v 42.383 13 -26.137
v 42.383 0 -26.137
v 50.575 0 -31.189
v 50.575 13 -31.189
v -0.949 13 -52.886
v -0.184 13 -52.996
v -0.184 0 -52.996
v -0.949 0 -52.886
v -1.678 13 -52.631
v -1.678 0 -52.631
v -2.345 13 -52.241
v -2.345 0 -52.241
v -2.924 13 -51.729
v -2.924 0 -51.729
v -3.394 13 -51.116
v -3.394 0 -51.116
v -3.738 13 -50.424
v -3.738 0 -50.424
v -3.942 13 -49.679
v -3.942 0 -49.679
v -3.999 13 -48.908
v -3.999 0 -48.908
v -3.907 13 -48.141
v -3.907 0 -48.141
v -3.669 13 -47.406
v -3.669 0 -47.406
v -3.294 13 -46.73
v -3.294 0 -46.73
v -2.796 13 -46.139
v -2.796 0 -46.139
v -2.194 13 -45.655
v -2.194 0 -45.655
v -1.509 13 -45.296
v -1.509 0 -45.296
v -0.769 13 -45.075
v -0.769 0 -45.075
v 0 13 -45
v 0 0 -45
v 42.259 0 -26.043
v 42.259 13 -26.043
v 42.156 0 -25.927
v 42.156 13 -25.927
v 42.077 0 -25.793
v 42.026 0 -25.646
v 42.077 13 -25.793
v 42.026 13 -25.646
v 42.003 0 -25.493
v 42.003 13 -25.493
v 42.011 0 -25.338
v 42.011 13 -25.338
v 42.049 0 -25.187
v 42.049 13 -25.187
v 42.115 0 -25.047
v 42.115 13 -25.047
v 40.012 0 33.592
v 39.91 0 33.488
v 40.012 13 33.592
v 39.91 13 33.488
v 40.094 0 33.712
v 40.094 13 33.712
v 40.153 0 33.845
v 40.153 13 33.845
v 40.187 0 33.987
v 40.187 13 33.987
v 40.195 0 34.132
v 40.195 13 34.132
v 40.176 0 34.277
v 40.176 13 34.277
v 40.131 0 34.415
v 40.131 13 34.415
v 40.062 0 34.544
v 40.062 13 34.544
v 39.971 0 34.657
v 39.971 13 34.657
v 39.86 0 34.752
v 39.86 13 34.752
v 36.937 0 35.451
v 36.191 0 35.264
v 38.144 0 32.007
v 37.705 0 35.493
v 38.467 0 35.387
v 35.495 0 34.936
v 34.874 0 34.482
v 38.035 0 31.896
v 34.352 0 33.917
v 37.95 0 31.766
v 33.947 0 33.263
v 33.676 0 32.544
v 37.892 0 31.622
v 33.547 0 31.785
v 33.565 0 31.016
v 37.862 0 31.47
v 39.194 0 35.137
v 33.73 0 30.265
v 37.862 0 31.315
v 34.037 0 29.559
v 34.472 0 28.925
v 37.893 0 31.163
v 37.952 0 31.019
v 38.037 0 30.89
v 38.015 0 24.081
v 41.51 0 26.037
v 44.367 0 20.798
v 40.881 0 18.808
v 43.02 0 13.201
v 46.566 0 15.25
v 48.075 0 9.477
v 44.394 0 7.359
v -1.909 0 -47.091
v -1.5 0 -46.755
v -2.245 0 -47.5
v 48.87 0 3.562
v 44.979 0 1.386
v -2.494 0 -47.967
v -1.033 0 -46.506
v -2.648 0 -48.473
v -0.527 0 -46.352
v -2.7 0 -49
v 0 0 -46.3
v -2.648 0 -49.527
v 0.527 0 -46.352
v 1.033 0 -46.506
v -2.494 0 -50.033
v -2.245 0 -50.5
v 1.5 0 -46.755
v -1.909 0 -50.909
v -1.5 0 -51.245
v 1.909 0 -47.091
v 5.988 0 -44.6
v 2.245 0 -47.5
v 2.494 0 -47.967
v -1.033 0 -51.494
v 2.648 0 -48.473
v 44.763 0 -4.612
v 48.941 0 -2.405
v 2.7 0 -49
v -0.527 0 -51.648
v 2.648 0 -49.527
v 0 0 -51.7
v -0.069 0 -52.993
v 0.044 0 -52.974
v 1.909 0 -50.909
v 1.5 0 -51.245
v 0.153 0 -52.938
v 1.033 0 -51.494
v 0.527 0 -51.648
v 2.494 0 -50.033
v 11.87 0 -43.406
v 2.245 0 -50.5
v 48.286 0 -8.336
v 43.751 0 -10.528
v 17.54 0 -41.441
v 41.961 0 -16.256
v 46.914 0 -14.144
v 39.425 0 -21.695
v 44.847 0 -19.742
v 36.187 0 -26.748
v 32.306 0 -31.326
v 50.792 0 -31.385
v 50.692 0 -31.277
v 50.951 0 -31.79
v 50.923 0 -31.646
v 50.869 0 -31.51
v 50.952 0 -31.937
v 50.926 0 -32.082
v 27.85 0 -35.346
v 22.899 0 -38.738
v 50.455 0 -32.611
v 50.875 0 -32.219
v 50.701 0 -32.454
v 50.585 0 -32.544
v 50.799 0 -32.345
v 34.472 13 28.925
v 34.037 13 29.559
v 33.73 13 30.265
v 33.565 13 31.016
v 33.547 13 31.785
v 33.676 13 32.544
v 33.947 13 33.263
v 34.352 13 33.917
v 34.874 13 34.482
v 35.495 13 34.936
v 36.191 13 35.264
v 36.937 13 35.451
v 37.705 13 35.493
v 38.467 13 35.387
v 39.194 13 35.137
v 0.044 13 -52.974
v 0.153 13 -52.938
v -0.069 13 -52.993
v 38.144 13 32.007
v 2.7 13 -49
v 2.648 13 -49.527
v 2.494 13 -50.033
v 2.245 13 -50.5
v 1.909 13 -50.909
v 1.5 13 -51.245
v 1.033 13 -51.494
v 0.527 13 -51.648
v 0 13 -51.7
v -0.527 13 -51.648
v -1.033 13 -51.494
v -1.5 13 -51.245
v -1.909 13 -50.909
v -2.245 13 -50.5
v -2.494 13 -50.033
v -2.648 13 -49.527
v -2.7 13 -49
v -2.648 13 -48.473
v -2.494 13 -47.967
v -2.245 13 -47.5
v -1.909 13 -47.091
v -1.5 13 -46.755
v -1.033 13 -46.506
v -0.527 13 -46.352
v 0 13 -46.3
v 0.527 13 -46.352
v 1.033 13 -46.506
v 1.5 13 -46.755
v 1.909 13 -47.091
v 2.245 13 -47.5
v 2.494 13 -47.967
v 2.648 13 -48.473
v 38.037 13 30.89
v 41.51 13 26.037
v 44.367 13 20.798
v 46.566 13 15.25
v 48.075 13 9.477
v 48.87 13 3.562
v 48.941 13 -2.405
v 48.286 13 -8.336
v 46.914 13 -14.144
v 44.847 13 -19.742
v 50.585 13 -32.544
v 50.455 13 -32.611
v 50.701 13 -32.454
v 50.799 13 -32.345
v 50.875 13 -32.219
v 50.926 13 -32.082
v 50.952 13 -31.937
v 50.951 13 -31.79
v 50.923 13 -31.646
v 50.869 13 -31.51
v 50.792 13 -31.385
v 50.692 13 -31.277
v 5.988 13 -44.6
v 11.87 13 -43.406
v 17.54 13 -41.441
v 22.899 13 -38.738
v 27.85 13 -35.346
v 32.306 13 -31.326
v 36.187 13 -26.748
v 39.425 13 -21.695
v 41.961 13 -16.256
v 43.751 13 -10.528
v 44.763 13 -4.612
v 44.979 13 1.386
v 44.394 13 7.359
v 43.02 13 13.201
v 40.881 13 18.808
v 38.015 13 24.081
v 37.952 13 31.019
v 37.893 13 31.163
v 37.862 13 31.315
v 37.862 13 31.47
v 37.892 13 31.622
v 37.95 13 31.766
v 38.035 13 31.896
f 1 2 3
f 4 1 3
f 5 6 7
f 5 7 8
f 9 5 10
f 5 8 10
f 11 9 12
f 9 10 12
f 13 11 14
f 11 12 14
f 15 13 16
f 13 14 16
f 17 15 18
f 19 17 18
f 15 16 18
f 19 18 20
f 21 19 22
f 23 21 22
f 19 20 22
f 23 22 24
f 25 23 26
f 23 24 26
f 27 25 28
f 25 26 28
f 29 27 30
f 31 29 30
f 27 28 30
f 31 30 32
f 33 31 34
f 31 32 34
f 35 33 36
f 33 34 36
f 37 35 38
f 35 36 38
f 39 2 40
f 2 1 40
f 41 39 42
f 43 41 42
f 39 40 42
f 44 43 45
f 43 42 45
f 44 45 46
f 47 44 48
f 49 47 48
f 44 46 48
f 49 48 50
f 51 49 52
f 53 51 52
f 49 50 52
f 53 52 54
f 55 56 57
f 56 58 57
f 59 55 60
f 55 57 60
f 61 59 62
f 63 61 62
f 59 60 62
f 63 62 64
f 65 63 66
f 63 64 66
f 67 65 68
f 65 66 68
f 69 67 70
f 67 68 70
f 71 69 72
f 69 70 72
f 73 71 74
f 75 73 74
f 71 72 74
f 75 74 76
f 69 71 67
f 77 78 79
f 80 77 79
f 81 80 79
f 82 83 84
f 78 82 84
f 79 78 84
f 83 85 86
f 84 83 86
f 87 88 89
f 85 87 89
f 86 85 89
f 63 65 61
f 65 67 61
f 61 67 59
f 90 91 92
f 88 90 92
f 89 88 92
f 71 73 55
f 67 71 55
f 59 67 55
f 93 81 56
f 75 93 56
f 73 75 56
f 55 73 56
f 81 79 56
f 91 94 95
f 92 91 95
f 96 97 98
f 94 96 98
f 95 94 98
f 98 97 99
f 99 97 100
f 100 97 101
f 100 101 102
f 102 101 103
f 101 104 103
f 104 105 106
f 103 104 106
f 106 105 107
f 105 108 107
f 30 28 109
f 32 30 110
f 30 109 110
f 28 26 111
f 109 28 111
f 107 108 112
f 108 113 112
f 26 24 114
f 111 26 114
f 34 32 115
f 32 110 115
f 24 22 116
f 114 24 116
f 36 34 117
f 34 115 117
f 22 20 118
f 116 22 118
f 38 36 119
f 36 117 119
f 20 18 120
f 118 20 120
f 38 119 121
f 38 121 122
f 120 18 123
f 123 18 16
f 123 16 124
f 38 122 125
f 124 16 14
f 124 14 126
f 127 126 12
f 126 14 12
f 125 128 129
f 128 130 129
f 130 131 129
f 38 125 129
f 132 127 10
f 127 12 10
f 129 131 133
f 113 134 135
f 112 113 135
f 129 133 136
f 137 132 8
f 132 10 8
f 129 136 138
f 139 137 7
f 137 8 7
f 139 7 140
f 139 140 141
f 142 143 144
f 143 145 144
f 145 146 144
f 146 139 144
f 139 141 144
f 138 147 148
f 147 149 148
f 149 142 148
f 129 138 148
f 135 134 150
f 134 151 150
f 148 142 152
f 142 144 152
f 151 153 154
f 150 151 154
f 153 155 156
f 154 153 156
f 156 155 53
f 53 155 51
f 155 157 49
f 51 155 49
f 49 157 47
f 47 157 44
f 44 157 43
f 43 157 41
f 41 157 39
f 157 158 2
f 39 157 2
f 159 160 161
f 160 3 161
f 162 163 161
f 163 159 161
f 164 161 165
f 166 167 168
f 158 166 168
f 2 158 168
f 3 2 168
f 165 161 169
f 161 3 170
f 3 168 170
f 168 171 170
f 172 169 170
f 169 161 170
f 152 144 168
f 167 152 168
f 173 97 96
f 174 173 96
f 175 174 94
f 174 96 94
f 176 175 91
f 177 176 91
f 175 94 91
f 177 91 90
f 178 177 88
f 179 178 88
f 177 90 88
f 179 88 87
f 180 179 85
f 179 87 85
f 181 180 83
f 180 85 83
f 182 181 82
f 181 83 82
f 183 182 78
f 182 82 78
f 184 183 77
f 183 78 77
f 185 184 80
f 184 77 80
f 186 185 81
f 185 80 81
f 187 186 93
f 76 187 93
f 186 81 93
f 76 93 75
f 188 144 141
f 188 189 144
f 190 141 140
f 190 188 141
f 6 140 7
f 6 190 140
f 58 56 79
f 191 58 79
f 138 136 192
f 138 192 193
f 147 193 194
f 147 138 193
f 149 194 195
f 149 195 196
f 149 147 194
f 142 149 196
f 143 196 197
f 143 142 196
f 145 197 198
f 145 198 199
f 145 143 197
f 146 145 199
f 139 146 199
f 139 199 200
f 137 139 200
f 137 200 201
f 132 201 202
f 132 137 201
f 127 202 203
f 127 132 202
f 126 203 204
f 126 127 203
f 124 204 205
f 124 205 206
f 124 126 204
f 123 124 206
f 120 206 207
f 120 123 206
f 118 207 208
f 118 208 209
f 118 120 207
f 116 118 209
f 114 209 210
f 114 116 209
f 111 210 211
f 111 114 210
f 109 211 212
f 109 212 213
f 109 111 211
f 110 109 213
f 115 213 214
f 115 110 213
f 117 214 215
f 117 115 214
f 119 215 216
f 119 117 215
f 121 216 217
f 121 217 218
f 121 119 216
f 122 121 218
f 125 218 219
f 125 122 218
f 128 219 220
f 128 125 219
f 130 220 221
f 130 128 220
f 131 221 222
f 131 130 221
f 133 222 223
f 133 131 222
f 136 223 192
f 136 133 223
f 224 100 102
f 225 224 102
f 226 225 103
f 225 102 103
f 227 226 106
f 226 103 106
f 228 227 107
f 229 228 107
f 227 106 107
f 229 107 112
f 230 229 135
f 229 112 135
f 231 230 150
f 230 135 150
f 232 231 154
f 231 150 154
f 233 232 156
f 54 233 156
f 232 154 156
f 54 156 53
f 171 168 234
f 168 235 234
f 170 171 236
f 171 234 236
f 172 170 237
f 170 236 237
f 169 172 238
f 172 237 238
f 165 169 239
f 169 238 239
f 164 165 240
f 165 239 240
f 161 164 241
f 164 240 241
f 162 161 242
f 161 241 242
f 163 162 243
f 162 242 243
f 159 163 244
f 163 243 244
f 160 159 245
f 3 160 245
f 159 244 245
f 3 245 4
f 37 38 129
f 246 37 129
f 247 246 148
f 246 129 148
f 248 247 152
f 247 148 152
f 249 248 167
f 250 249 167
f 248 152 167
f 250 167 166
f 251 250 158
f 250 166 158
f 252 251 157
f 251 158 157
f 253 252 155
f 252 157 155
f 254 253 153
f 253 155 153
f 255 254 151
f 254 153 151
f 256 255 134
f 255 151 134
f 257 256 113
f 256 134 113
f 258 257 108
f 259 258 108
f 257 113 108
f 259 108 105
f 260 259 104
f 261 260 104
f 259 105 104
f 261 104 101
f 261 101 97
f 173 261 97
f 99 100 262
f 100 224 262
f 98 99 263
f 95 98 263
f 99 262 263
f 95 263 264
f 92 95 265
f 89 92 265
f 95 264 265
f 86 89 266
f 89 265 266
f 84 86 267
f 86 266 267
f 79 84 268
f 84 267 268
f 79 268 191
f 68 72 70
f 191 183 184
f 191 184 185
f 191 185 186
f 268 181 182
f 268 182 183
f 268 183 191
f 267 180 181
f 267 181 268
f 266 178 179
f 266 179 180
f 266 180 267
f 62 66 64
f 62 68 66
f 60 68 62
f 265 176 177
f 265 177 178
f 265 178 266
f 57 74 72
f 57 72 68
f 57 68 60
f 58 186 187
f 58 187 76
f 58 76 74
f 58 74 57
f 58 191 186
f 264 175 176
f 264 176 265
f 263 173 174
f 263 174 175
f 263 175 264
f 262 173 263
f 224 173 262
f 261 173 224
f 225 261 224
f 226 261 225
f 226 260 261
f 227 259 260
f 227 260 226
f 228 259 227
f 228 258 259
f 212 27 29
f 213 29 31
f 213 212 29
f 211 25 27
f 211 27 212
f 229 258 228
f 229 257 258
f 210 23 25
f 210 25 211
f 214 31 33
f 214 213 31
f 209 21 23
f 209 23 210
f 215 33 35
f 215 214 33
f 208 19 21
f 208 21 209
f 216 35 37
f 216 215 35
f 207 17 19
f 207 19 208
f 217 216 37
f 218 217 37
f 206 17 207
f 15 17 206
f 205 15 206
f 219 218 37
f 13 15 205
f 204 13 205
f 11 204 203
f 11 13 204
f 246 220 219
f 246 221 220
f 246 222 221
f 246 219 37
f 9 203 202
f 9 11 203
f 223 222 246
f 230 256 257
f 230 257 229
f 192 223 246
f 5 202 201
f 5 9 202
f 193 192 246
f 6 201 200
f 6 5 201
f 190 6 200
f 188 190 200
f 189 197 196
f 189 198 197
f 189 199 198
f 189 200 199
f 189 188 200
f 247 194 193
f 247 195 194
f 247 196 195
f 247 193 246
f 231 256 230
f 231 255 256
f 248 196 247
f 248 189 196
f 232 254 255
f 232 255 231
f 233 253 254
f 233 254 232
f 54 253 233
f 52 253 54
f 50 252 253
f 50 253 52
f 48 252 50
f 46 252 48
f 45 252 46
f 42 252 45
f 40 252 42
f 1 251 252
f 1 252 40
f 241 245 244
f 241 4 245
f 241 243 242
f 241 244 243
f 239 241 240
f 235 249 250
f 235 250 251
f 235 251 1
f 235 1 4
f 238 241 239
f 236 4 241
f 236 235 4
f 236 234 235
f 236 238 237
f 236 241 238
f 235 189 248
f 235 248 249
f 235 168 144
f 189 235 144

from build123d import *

# Parameters (mm, degrees)
SKETCH1_R           = 2.7
BOSS_EXTRUDE1_DEPTH = 13
FILLET1_R           = 0.8


with BuildPart() as part:
    # Sketch1 → Boss-Extrude1 (new body)
    with BuildSketch(Plane(origin=(0, 0, 0), x_dir=(1, 0, 0), z_dir=(0, 1, 0))):
        with BuildLine():
            Line((51.921017872, 32.018867925), (0, 53))
            ThreePointArc((0, 53), (-4, 49), (0, 45))
            ThreePointArc((0, 45), (40.783850417, 19.017821778), (34.47199994, -28.925442436))
            ThreePointArc((34.47199994, -28.925442436), (34.965027274, -34.560770647), (40.600355485, -34.067743313))
            Line((40.600355485, -34.067743313), (37.536177713, -31.496592875))
            ThreePointArc((37.536177713, -31.496592875), (48.870327604, -3.562454189), (41.707047143, 25.720074234))
            Line((41.707047143, 25.720074234), (51.921017872, 32.018867925))
        make_face()
        with Locations((0, 49)):
            Circle(SKETCH1_R, mode=Mode.SUBTRACT)
    extrude(amount=BOSS_EXTRUDE1_DEPTH)

    # Fillet1
    fillet1_edges = [part.edges().sort_by_distance(p)[0] for p in [
        (51.921017872, 6.5, -32.018867925),
        (41.707047143, 6.5, -25.720074234),
        (37.536177713, 6.5, 31.496592875),
        (40.600355485, 6.5, 34.067743313),
        (0, 6.5, -53),
    ]]
    fillet(fillet1_edges, radius=FILLET1_R)


solid = part.part
